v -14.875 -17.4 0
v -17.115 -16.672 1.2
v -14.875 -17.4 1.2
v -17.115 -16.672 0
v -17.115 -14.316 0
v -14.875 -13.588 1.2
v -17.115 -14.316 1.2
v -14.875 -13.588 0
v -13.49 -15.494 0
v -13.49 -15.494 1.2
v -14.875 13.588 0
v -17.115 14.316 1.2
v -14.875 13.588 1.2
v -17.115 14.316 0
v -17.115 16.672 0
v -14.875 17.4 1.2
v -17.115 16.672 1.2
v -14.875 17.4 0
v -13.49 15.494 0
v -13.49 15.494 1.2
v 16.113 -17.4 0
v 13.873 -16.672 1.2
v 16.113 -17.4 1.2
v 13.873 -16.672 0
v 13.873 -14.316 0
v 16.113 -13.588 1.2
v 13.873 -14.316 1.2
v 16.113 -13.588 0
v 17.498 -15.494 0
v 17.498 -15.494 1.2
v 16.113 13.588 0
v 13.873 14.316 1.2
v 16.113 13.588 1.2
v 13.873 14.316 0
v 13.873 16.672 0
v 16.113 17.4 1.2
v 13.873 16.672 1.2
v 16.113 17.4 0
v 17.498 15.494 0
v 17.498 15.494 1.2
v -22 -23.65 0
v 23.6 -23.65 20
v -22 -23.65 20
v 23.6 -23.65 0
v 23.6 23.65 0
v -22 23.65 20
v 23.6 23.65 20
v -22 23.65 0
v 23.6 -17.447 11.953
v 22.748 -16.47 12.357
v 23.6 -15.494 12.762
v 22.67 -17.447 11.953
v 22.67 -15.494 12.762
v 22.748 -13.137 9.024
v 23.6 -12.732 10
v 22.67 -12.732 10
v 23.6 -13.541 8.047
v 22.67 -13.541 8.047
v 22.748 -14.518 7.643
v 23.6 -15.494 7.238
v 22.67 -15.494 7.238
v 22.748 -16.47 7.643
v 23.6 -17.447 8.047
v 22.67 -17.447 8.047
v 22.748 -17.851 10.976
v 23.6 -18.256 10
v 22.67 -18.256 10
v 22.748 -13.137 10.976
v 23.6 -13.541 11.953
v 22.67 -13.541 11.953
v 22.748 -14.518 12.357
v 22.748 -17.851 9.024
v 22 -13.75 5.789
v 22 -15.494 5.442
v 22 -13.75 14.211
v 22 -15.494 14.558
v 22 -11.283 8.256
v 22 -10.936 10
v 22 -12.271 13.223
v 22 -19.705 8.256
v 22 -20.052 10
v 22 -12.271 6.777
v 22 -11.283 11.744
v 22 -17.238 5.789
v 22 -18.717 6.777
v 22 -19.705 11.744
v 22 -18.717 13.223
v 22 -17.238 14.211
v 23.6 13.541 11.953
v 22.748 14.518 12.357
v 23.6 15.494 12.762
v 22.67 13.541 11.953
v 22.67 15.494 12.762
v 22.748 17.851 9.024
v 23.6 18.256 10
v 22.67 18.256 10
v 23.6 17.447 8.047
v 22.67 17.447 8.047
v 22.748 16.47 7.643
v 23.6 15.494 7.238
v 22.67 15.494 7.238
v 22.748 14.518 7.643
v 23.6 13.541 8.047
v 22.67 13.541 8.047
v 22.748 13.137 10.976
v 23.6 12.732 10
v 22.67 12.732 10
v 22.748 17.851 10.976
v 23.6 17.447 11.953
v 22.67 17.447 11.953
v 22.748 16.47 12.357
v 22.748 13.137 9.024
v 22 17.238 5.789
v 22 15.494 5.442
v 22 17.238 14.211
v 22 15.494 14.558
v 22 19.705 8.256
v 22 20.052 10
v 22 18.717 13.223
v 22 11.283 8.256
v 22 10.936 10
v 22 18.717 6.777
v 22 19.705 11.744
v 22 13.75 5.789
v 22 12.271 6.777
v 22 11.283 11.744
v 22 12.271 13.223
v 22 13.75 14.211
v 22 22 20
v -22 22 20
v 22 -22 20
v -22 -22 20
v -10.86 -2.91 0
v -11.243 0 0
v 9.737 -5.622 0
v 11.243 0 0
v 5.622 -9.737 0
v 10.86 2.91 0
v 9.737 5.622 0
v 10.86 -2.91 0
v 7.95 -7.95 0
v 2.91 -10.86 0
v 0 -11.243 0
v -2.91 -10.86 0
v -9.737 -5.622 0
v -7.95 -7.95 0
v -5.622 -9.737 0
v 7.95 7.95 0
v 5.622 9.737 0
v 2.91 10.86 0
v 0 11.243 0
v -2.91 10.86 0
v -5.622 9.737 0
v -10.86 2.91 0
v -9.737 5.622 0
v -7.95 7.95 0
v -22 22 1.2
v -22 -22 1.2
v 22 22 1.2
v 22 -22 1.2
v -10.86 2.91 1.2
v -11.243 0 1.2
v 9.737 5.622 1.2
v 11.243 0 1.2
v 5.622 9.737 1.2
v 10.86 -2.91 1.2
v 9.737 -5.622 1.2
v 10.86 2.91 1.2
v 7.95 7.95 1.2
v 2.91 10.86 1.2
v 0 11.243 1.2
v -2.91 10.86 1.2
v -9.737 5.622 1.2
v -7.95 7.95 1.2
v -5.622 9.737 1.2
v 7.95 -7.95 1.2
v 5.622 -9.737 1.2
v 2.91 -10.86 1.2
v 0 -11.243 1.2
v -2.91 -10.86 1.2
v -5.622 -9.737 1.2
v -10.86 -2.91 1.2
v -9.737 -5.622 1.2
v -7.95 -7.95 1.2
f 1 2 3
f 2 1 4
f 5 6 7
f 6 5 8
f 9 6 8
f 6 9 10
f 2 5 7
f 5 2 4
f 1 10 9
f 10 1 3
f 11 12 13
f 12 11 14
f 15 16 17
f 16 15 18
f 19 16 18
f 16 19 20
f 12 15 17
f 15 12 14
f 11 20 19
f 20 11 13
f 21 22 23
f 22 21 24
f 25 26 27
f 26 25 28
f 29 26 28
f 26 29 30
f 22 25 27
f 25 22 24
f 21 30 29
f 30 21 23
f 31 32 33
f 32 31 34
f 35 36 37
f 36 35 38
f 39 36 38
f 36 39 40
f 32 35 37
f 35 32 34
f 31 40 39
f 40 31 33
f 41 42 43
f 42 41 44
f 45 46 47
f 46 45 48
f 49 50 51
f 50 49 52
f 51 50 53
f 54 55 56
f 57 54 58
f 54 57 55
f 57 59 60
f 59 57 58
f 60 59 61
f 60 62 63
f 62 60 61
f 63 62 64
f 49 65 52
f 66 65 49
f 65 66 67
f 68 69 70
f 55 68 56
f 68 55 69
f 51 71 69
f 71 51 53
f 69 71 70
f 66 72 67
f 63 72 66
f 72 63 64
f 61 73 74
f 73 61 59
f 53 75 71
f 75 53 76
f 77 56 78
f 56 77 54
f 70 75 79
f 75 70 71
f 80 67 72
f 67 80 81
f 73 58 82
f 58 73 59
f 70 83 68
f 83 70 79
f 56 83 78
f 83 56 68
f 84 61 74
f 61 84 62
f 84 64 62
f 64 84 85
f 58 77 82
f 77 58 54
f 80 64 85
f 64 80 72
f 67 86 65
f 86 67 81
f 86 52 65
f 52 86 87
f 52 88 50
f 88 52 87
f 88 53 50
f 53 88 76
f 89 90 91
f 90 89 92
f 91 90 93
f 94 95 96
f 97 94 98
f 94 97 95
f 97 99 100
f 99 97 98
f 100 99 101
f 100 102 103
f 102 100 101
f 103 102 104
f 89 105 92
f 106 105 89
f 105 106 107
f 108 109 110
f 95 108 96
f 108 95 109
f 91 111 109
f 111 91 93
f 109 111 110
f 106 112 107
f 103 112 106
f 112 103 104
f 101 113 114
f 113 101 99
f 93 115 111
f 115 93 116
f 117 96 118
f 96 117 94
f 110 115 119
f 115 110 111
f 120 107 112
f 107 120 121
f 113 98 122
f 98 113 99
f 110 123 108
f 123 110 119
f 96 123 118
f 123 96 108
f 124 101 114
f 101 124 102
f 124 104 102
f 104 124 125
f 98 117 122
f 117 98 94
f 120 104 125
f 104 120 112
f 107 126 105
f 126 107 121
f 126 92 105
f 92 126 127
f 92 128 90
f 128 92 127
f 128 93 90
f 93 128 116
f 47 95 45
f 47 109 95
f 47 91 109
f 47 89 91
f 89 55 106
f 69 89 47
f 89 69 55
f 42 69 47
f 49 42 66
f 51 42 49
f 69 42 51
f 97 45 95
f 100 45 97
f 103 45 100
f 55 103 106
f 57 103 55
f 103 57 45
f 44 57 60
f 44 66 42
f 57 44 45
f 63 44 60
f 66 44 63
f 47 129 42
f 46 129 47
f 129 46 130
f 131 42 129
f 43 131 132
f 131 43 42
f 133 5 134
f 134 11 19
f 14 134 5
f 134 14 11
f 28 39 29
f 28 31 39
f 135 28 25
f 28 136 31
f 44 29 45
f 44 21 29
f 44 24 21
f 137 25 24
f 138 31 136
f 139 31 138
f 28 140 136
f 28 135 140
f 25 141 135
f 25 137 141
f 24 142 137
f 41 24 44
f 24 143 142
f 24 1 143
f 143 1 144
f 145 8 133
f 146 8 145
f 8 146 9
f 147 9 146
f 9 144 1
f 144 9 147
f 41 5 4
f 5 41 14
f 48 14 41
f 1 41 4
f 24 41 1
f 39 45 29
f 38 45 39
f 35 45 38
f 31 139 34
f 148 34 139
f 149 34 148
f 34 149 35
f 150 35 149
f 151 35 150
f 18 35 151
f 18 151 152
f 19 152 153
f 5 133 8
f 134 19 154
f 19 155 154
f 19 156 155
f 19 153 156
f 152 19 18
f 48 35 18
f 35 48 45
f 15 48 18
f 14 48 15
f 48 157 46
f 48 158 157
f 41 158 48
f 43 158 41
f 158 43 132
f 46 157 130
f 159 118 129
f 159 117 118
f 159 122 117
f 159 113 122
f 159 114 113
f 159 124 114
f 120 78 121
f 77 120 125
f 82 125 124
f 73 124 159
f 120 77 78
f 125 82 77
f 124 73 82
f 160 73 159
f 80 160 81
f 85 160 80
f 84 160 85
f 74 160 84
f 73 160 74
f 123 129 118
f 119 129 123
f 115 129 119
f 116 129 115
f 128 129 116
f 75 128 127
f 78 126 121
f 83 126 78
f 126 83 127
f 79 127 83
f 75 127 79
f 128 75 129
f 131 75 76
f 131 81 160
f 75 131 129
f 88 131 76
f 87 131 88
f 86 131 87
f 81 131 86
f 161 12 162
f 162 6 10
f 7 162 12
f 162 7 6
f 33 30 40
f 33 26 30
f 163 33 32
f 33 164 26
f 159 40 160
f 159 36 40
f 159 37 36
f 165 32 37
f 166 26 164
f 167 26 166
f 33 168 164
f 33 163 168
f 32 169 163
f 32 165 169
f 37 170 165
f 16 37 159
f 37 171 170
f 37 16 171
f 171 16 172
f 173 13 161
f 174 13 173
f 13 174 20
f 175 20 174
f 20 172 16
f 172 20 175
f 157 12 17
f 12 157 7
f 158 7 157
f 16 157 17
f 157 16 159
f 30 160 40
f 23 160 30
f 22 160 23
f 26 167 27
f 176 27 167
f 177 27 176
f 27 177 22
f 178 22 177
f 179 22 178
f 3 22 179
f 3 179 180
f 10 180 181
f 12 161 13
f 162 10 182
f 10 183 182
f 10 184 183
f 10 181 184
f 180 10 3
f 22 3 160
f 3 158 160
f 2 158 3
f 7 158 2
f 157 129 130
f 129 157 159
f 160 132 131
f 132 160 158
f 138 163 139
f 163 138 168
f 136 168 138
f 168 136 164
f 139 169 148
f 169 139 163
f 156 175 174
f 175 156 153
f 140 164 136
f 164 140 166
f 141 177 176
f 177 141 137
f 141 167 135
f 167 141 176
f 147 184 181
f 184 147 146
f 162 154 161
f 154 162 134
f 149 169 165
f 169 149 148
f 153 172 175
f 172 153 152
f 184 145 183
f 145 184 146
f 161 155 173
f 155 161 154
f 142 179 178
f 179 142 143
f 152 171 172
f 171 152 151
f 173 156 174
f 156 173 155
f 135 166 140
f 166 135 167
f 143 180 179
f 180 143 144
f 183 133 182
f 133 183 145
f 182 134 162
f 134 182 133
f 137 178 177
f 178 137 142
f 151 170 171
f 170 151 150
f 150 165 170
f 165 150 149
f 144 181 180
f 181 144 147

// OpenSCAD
// NEMA 17 stepper mount for dynamometer
// Ed Nisley KE4ZNU August 2011
mm = 1;
inch = 25.4 * mm;
 
//-- Layout Control
 
Layout = "Build";               // Build Show
 
//-- Extrusion parameters
 
ThreadThick = 0.4;
ThreadWT = 2.0;
ThreadWidth = ThreadThick * ThreadWT;
 
HoleWindage = 0.3;          // enlarge hole dia by this amount
 
function IntegerMultiple(Size,Unit) = Unit * ceil(Size / Unit);
 
//-- Useful sizes
 
Tap10_32 = 0.159 * inch;
Clear10_32 = 0.190 * inch;
Head10_32 = 0.373 * inch;
Head10_32Thick = 0.110 * inch;
Nut10_32Dia = 0.433 * inch;
Nut10_32Thick = 0.130 * inch;
 
NEMA17_ShaftDia = 5.0 * mm;
NEMA17_ShaftLength = 24.0 * mm;
NEMA17_PilotDia = 0.866 * inch;
NEMA17_PilotLength = 0.080 * inch;
NEMA17_BCD = 1.725 * inch;
NEMA17_BoltDia = 3.5 * mm;
NEMA17_BoltOC = 1.220 * inch;
 
//-- Mount Sizes
 
MountWidth = IntegerMultiple(NEMA17_BCD,ThreadWidth);       // use BCD for motor clearance
MountThick = IntegerMultiple(1.0,ThreadThick);              // for stiffness
 
MountBoltDia = 3.0;
 
StandThick = IntegerMultiple(1.0,ThreadWidth);              // baseplate
 
StrutThick = IntegerMultiple(1.0,ThreadWidth);              // sides holding motor mount
 
UprightLength = MountWidth + 2*StrutThick;
 
StandBoltHead = IntegerMultiple(Head10_32,5);               // bolt head rounded up
StandBoltOC = IntegerMultiple(UprightLength + 2*StandBoltHead,5);
 
StandLength = StandBoltOC + 2*StandBoltHead;
StandWidth = IntegerMultiple(2*StandBoltHead,ThreadThick);
 
StandBoltClear = (StandLength - UprightLength)/2;           // flat around bolt head
 
MotorRecess = StandWidth - MountThick;
 
echo(str("Stand Base: ",StandLength," x ",StandWidth," x ",StandThick));
echo(str("Stand Bolt OC: ",StandBoltOC));
echo(str("Strut Thick: ",StrutThick));
 
//-- Convenience values
 
Protrusion = 0.1;       // make holes look good and joints intersect properly
 
BuildOffset = 3 * ThreadWidth;
 
//----------------------
// Useful routines
 
module PolyCyl(Dia,Height,ForceSides=0) {           // based on nophead's polyholes
 
  Sides = (ForceSides != 0) ? ForceSides : (ceil(Dia) + 2);
 
  FixDia = Dia / cos(180/Sides);
 
  cylinder(r=(FixDia + HoleWindage)/2,
           h=Height,
       $fn=Sides);
}
 
module ShowPegGrid(Space = 10.0,Size = 1.0) {
 
  Range = floor(50 / Space);
 
    for (x=[-Range:Range])
      for (y=[-Range:Range])
        translate([x*Space,y*Space,Size/2])
          %cube(Size,center=true);
 
}
 
//----------------------
// Combined stand and mounting plate
 
module Combined() {
 
  difference() {
    translate([StandThick/2,0,StandWidth/2])
      cube([(MountWidth + StandThick),StandLength,StandWidth],center=true);
    translate([-Protrusion/2,0,StandWidth - (MotorRecess - Protrusion)/2])
      cube([(MountWidth + Protrusion),MountWidth,(MotorRecess + Protrusion)],center=true);
    translate([0,0,-Protrusion])                // pilot hole
      PolyCyl(NEMA17_PilotDia,(MountThick + 2*Protrusion));
    for (x=[-1,1])                              // motor bolt holes
      for (y=[-1,1])
        translate([x*NEMA17_BoltOC/2,y*NEMA17_BoltOC/2,-Protrusion])
          PolyCyl(MountBoltDia,(MountThick + 2*Protrusion));
    for (y=[-1,1])                              // cutouts over bolts
      translate([-Protrusion/2,
                y*((StandLength - StandBoltClear)/2 + Protrusion),
                StandWidth/2])
        cube([(MountWidth + Protrusion+ 20),
             (StandBoltClear + Protrusion),
             (StandWidth+ 2*Protrusion)],center=true);
    for (y=[-1,1])                              // stand bolt holes
      translate([(MountWidth/2 - Protrusion),y*NEMA17_BoltOC/2,StandWidth/2])
        rotate([0,90,0]){
          PolyCyl(Clear10_32,StandThick + 2*Protrusion,8);
          cylinder(r1=Clear10_32,r2=0,h=StandThick + 2*Protrusion);
        }
 
  }
 
}
 
//----------------------
// Lash everything together
 
ShowPegGrid();
 
if (Layout == "Build") {
  translate([0,0,0])
    Combined();
}
 
if (Layout == "Show") {
  translate([-StandWidth/2,0,(StandThick + MountWidth/2)])
    rotate([0,90,0])
      Combined();
}
